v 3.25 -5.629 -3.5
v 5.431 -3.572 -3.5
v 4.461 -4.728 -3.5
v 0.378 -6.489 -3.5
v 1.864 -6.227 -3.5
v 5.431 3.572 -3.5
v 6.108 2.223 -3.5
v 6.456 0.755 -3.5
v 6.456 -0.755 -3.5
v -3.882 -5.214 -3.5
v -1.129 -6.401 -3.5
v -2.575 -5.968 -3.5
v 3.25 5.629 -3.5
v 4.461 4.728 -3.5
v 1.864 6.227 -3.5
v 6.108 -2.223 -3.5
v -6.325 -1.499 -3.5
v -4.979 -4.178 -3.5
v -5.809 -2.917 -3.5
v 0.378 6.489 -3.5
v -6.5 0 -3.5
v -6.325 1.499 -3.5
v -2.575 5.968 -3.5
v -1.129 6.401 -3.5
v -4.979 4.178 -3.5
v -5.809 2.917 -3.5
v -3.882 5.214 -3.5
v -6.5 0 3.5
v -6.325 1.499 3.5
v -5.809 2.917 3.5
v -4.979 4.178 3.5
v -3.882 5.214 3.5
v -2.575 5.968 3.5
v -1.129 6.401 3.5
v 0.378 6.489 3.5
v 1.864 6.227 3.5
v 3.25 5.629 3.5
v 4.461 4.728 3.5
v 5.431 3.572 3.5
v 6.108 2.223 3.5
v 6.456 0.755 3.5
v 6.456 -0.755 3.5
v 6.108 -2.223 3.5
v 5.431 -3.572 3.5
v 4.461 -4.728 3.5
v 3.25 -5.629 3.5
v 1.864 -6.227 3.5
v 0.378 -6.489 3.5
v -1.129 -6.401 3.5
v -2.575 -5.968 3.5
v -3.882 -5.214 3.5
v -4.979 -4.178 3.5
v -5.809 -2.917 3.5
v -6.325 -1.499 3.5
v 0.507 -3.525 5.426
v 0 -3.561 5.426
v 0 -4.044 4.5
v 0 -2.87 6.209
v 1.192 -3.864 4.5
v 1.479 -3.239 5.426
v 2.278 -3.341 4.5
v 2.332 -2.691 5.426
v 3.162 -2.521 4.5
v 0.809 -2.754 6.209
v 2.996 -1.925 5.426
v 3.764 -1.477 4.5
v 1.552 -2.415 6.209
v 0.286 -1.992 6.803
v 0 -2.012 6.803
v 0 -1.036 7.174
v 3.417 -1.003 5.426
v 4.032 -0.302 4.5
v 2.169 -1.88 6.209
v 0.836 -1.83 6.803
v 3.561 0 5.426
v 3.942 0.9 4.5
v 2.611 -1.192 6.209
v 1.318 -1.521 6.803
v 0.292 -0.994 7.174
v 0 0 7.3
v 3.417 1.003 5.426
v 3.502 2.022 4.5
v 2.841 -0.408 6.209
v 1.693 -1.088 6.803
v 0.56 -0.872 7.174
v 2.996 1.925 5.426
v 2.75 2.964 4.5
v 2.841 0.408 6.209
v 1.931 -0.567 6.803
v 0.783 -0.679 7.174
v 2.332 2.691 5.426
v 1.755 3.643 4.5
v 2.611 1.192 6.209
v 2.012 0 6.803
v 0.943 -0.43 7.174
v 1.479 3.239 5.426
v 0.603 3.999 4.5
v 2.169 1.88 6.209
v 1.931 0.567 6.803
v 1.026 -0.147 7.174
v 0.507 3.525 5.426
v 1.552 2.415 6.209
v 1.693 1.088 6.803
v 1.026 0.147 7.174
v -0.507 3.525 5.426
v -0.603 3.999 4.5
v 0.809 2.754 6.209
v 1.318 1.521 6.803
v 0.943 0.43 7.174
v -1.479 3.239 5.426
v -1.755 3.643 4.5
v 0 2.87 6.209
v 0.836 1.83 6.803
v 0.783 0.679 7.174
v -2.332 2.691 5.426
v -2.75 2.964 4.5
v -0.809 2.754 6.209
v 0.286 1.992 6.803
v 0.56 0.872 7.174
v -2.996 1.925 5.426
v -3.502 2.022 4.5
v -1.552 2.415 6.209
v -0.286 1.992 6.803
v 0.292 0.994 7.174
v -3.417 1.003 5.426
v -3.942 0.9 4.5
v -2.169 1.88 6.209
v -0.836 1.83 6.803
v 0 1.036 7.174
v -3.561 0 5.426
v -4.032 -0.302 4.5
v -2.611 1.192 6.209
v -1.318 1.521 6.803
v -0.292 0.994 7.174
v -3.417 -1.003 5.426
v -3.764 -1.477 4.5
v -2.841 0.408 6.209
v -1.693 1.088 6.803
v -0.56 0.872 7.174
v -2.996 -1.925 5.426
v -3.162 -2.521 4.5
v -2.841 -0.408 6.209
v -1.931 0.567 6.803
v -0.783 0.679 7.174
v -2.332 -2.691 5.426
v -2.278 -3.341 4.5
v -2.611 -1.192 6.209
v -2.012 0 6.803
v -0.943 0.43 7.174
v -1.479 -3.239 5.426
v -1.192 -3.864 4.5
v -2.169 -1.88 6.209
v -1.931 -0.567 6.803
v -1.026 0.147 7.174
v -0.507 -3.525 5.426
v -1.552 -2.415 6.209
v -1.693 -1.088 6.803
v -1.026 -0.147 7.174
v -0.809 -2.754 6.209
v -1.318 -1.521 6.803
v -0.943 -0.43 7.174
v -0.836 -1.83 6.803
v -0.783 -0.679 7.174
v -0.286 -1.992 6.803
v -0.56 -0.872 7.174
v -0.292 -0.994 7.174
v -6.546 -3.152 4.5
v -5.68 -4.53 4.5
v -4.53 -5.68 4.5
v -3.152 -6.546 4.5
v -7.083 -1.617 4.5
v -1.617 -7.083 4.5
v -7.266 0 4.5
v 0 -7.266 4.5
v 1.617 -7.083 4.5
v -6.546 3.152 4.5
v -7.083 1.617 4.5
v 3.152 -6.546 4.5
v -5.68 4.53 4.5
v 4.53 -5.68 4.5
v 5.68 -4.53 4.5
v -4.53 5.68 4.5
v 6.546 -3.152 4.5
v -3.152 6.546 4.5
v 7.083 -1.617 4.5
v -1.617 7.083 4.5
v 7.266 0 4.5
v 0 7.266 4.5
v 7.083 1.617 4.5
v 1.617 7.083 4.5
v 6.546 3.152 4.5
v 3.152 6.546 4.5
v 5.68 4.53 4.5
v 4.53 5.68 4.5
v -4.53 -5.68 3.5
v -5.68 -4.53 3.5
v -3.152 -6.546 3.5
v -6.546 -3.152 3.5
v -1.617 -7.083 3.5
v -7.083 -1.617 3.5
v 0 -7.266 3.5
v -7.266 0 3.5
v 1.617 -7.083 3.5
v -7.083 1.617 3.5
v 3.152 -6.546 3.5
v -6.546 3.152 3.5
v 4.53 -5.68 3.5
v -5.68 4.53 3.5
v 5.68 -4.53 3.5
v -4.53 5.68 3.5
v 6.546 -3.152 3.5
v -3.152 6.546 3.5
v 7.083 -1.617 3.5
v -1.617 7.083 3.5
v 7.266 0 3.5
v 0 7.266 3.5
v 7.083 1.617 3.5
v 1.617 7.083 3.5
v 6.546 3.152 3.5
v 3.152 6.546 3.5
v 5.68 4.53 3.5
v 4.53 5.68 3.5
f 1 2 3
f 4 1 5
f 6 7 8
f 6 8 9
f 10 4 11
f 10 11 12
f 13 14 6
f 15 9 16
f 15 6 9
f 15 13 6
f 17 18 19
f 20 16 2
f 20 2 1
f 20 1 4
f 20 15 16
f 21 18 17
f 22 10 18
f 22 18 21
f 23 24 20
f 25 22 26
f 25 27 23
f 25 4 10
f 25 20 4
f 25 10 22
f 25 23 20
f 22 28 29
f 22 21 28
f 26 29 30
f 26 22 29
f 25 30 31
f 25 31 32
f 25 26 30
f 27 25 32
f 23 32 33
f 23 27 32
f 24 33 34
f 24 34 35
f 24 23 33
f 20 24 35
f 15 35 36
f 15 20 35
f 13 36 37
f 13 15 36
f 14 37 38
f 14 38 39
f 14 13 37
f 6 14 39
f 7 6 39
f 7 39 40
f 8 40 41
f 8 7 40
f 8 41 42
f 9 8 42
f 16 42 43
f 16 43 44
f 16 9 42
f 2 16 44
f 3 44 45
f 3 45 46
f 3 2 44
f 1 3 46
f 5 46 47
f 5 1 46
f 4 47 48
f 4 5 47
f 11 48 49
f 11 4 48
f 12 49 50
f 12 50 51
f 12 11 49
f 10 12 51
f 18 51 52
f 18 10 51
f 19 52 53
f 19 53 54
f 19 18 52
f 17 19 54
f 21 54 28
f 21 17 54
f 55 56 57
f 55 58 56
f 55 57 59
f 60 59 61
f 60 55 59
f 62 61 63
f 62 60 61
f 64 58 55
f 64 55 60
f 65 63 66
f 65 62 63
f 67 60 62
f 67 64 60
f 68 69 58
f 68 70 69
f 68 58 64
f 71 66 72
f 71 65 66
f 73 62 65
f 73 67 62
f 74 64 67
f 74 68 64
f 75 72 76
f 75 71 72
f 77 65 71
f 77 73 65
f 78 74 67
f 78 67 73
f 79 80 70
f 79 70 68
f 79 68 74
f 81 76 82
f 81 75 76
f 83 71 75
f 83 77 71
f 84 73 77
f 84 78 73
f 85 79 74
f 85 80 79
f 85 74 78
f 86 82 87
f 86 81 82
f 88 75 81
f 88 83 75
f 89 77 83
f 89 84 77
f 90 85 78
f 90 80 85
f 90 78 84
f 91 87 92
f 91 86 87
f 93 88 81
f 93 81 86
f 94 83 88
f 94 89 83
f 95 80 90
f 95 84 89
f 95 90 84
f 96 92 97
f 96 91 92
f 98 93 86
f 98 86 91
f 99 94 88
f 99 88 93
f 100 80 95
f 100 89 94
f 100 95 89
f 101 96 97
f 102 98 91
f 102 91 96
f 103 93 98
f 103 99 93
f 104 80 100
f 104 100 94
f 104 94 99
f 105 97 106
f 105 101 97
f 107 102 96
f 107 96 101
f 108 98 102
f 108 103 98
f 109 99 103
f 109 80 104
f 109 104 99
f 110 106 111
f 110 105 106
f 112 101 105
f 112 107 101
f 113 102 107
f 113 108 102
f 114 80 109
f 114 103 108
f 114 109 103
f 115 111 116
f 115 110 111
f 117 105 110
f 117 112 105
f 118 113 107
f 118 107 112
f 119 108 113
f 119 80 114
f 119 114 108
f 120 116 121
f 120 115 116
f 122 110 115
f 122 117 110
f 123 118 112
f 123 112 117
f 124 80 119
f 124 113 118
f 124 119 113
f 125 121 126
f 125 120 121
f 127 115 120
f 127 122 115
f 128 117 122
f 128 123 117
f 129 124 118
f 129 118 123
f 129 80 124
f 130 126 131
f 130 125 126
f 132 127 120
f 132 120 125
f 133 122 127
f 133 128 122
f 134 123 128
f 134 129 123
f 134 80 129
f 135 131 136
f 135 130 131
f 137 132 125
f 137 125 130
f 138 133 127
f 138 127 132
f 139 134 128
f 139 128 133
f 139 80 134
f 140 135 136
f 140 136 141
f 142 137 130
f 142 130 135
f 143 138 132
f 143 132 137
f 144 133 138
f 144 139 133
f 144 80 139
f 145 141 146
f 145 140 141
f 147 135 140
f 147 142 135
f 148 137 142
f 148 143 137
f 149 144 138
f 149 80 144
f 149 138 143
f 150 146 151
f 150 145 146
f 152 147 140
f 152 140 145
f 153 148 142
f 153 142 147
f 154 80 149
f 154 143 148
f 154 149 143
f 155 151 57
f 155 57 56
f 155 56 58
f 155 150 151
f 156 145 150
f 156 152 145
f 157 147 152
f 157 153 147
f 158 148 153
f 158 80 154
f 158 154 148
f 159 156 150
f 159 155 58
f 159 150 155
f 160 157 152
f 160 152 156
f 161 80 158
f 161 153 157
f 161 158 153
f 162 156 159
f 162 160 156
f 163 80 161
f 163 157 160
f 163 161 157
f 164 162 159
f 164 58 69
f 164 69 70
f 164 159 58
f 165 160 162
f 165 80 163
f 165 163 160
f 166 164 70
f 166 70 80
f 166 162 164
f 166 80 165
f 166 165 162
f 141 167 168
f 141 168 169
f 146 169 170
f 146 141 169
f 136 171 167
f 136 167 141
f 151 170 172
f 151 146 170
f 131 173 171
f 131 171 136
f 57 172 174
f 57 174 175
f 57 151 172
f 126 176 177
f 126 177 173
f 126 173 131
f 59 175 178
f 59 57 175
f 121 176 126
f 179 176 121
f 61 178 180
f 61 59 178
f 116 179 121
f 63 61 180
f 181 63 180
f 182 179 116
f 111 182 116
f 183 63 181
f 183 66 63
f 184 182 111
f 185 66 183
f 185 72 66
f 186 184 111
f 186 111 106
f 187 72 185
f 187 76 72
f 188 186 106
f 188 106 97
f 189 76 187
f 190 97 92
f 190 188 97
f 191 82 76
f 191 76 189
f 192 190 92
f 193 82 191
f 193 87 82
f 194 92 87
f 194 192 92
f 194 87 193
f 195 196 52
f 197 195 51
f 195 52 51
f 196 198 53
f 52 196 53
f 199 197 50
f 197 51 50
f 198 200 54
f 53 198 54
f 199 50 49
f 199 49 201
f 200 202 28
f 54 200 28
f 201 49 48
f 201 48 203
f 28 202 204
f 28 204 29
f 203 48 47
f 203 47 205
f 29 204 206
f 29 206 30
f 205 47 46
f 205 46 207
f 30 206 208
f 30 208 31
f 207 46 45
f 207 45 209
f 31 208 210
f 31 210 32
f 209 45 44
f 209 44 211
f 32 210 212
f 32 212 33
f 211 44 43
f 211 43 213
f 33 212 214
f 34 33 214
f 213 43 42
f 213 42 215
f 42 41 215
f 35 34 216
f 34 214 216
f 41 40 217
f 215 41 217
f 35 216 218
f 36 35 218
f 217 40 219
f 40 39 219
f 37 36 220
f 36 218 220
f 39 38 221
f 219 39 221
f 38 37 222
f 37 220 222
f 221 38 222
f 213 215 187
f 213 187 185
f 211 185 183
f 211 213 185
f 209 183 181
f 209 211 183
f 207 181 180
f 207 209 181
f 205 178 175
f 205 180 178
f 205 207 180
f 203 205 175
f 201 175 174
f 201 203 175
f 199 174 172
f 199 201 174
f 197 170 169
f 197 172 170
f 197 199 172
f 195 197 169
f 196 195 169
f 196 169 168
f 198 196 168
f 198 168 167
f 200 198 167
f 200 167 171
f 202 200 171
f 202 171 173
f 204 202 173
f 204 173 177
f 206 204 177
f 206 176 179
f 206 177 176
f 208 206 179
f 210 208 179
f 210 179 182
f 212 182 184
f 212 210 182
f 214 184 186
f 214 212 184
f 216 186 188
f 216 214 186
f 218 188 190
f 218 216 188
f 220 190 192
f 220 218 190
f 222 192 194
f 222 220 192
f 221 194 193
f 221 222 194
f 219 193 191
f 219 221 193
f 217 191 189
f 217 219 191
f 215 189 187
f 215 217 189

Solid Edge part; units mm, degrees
sketch "Sketch1" plane through (0, 0, 0) normal (0, -1, 0) x (1, 0, 0)
  line L0 (-6.5, 3.5) -> (-6.5, -3.5)
  line L1 (-6.5, -3.5) -> (0, -3.5)
  line L2 (0, 3.5) -> (0, -3.5)
  line L3 (0, 3.5) -> (-6.5, 3.5)
revolve "RevolvedProtrusion1" add sketch "Sketch1" angle 360 about axis through (0, 0, 3.5) along (0, 0, -1)
sketch "Sketch2" plane through (0, 0, 3.5) normal (0, 0, 1) x (1, 0, 0)
  circle A0 centre (0, 0) radius 7.2656
extrude "Protrusion1" add sketch "Sketch2" along normal blind 1
sketch "Sketch3" plane through (0, 0, 0) normal (1, 0, 0) x (0, 1, 0)
  line L0 (0, 7.3) -> (0, -1.34)
  arc A0 (0, -1.34) -> (0, 7.3) centre (0, 2.98) cw
revolve "RevolvedProtrusion2" add sketch "Sketch3" angle 360 about axis through (0, 0, 7.3) along (0, 0, -1)
properties material "Alluminio 11/S EN AW 2011"
